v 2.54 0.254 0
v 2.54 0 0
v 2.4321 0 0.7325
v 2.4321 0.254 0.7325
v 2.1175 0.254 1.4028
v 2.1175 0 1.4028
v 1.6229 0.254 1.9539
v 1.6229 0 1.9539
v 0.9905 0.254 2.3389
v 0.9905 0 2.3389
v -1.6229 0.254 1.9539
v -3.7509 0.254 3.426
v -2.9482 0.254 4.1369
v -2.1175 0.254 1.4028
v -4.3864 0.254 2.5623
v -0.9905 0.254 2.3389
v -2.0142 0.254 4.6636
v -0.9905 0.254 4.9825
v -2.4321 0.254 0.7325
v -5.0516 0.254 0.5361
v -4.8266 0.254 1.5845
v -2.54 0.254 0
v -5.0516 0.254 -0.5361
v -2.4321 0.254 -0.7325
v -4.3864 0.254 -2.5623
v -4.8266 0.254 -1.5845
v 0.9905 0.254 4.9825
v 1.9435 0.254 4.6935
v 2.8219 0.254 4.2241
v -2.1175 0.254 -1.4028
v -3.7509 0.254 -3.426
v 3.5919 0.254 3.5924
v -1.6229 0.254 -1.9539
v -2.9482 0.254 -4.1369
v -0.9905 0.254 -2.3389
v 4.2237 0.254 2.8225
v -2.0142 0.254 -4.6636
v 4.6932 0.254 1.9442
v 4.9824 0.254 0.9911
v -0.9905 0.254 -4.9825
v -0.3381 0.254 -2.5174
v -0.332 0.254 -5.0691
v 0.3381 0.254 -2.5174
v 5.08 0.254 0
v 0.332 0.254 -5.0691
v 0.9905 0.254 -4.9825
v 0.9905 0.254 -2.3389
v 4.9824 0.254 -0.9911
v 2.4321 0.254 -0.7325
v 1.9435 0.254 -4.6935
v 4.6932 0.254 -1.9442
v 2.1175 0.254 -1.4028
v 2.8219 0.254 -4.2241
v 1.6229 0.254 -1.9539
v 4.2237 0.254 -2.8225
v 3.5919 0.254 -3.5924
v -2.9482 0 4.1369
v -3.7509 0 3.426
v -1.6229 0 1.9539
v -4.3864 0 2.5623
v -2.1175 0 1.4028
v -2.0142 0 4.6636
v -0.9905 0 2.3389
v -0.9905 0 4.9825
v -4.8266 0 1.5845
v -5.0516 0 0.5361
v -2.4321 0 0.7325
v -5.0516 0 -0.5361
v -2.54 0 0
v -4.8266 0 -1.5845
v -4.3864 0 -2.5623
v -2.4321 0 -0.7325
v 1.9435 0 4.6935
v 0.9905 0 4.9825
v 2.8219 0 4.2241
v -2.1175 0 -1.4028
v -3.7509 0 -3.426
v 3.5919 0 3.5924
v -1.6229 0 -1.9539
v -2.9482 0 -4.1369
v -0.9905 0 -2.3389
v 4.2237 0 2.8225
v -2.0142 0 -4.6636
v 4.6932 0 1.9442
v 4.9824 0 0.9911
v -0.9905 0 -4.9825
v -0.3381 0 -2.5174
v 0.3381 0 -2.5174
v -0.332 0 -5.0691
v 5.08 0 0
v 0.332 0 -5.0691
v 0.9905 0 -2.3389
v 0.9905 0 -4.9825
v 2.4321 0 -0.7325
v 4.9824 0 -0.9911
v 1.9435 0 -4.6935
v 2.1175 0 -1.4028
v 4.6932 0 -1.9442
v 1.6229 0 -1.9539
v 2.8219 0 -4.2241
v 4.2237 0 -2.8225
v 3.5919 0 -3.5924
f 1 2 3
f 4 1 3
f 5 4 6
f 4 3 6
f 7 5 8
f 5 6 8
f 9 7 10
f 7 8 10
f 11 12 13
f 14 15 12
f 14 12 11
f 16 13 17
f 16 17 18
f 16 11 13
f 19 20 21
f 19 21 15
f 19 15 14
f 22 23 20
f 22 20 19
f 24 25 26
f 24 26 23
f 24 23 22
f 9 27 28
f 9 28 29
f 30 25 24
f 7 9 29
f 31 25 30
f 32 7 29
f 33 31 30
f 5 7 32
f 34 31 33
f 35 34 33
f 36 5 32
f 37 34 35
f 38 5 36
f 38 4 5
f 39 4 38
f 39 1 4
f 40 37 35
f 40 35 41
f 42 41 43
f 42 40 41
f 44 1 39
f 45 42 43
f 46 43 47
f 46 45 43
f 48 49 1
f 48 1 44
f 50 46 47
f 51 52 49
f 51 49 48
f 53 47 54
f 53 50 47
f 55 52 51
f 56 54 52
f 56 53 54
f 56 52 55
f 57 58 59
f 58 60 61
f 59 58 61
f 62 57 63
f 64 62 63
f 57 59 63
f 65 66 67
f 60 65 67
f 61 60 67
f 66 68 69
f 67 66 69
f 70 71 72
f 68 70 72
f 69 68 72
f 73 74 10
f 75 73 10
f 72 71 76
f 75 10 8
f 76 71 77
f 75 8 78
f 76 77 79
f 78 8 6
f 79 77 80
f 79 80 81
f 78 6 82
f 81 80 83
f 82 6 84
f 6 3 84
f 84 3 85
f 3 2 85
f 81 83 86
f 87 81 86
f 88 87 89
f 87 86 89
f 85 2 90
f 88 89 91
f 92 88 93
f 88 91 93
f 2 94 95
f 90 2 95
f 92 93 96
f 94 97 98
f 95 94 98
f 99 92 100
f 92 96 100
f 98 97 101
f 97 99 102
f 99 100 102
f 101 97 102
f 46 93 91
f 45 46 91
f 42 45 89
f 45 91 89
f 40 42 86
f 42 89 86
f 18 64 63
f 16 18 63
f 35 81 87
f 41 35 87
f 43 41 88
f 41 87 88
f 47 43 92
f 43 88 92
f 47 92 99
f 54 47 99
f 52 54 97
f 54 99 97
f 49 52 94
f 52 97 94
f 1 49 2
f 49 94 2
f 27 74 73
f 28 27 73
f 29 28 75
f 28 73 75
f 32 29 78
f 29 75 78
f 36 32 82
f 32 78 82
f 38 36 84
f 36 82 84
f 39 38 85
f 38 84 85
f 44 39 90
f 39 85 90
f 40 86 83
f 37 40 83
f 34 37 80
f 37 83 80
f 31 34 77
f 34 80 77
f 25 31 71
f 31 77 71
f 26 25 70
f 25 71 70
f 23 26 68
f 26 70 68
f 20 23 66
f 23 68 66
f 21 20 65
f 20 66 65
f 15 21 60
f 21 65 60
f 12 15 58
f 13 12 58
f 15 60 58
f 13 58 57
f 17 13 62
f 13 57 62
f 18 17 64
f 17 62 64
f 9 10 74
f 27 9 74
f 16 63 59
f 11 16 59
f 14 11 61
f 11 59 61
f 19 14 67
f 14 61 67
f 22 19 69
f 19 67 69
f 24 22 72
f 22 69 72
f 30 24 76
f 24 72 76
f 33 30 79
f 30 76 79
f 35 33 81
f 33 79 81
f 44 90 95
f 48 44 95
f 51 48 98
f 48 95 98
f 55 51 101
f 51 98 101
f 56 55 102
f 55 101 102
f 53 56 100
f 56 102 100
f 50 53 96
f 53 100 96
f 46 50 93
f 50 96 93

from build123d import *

# Parameters (mm, degrees)
BOSS_EXTRUDE1_DEPTH = 0.254


with BuildPart() as part:
    # Sketch1 → Boss-Extrude1 (new body)
    with BuildSketch(Plane(origin=(0, 0, 0), x_dir=(1, 0, 0), z_dir=(0, 1, 0))):
        with BuildLine():
            Line((-0.990450861, -4.98251012), (-0.990450861, -2.338932896))
            ThreePointArc((-0.990450861, -2.338932896), (0, 2.54), (0.990450861, -2.338932896))
            Line((0.990450861, -2.338932896), (0.990450861, -4.98251012))
            ThreePointArc((0.990450861, -4.98251012), (0, 5.08), (-0.990450861, -4.98251012))
        make_face()
    extrude(amount=BOSS_EXTRUDE1_DEPTH)


solid = part.part
